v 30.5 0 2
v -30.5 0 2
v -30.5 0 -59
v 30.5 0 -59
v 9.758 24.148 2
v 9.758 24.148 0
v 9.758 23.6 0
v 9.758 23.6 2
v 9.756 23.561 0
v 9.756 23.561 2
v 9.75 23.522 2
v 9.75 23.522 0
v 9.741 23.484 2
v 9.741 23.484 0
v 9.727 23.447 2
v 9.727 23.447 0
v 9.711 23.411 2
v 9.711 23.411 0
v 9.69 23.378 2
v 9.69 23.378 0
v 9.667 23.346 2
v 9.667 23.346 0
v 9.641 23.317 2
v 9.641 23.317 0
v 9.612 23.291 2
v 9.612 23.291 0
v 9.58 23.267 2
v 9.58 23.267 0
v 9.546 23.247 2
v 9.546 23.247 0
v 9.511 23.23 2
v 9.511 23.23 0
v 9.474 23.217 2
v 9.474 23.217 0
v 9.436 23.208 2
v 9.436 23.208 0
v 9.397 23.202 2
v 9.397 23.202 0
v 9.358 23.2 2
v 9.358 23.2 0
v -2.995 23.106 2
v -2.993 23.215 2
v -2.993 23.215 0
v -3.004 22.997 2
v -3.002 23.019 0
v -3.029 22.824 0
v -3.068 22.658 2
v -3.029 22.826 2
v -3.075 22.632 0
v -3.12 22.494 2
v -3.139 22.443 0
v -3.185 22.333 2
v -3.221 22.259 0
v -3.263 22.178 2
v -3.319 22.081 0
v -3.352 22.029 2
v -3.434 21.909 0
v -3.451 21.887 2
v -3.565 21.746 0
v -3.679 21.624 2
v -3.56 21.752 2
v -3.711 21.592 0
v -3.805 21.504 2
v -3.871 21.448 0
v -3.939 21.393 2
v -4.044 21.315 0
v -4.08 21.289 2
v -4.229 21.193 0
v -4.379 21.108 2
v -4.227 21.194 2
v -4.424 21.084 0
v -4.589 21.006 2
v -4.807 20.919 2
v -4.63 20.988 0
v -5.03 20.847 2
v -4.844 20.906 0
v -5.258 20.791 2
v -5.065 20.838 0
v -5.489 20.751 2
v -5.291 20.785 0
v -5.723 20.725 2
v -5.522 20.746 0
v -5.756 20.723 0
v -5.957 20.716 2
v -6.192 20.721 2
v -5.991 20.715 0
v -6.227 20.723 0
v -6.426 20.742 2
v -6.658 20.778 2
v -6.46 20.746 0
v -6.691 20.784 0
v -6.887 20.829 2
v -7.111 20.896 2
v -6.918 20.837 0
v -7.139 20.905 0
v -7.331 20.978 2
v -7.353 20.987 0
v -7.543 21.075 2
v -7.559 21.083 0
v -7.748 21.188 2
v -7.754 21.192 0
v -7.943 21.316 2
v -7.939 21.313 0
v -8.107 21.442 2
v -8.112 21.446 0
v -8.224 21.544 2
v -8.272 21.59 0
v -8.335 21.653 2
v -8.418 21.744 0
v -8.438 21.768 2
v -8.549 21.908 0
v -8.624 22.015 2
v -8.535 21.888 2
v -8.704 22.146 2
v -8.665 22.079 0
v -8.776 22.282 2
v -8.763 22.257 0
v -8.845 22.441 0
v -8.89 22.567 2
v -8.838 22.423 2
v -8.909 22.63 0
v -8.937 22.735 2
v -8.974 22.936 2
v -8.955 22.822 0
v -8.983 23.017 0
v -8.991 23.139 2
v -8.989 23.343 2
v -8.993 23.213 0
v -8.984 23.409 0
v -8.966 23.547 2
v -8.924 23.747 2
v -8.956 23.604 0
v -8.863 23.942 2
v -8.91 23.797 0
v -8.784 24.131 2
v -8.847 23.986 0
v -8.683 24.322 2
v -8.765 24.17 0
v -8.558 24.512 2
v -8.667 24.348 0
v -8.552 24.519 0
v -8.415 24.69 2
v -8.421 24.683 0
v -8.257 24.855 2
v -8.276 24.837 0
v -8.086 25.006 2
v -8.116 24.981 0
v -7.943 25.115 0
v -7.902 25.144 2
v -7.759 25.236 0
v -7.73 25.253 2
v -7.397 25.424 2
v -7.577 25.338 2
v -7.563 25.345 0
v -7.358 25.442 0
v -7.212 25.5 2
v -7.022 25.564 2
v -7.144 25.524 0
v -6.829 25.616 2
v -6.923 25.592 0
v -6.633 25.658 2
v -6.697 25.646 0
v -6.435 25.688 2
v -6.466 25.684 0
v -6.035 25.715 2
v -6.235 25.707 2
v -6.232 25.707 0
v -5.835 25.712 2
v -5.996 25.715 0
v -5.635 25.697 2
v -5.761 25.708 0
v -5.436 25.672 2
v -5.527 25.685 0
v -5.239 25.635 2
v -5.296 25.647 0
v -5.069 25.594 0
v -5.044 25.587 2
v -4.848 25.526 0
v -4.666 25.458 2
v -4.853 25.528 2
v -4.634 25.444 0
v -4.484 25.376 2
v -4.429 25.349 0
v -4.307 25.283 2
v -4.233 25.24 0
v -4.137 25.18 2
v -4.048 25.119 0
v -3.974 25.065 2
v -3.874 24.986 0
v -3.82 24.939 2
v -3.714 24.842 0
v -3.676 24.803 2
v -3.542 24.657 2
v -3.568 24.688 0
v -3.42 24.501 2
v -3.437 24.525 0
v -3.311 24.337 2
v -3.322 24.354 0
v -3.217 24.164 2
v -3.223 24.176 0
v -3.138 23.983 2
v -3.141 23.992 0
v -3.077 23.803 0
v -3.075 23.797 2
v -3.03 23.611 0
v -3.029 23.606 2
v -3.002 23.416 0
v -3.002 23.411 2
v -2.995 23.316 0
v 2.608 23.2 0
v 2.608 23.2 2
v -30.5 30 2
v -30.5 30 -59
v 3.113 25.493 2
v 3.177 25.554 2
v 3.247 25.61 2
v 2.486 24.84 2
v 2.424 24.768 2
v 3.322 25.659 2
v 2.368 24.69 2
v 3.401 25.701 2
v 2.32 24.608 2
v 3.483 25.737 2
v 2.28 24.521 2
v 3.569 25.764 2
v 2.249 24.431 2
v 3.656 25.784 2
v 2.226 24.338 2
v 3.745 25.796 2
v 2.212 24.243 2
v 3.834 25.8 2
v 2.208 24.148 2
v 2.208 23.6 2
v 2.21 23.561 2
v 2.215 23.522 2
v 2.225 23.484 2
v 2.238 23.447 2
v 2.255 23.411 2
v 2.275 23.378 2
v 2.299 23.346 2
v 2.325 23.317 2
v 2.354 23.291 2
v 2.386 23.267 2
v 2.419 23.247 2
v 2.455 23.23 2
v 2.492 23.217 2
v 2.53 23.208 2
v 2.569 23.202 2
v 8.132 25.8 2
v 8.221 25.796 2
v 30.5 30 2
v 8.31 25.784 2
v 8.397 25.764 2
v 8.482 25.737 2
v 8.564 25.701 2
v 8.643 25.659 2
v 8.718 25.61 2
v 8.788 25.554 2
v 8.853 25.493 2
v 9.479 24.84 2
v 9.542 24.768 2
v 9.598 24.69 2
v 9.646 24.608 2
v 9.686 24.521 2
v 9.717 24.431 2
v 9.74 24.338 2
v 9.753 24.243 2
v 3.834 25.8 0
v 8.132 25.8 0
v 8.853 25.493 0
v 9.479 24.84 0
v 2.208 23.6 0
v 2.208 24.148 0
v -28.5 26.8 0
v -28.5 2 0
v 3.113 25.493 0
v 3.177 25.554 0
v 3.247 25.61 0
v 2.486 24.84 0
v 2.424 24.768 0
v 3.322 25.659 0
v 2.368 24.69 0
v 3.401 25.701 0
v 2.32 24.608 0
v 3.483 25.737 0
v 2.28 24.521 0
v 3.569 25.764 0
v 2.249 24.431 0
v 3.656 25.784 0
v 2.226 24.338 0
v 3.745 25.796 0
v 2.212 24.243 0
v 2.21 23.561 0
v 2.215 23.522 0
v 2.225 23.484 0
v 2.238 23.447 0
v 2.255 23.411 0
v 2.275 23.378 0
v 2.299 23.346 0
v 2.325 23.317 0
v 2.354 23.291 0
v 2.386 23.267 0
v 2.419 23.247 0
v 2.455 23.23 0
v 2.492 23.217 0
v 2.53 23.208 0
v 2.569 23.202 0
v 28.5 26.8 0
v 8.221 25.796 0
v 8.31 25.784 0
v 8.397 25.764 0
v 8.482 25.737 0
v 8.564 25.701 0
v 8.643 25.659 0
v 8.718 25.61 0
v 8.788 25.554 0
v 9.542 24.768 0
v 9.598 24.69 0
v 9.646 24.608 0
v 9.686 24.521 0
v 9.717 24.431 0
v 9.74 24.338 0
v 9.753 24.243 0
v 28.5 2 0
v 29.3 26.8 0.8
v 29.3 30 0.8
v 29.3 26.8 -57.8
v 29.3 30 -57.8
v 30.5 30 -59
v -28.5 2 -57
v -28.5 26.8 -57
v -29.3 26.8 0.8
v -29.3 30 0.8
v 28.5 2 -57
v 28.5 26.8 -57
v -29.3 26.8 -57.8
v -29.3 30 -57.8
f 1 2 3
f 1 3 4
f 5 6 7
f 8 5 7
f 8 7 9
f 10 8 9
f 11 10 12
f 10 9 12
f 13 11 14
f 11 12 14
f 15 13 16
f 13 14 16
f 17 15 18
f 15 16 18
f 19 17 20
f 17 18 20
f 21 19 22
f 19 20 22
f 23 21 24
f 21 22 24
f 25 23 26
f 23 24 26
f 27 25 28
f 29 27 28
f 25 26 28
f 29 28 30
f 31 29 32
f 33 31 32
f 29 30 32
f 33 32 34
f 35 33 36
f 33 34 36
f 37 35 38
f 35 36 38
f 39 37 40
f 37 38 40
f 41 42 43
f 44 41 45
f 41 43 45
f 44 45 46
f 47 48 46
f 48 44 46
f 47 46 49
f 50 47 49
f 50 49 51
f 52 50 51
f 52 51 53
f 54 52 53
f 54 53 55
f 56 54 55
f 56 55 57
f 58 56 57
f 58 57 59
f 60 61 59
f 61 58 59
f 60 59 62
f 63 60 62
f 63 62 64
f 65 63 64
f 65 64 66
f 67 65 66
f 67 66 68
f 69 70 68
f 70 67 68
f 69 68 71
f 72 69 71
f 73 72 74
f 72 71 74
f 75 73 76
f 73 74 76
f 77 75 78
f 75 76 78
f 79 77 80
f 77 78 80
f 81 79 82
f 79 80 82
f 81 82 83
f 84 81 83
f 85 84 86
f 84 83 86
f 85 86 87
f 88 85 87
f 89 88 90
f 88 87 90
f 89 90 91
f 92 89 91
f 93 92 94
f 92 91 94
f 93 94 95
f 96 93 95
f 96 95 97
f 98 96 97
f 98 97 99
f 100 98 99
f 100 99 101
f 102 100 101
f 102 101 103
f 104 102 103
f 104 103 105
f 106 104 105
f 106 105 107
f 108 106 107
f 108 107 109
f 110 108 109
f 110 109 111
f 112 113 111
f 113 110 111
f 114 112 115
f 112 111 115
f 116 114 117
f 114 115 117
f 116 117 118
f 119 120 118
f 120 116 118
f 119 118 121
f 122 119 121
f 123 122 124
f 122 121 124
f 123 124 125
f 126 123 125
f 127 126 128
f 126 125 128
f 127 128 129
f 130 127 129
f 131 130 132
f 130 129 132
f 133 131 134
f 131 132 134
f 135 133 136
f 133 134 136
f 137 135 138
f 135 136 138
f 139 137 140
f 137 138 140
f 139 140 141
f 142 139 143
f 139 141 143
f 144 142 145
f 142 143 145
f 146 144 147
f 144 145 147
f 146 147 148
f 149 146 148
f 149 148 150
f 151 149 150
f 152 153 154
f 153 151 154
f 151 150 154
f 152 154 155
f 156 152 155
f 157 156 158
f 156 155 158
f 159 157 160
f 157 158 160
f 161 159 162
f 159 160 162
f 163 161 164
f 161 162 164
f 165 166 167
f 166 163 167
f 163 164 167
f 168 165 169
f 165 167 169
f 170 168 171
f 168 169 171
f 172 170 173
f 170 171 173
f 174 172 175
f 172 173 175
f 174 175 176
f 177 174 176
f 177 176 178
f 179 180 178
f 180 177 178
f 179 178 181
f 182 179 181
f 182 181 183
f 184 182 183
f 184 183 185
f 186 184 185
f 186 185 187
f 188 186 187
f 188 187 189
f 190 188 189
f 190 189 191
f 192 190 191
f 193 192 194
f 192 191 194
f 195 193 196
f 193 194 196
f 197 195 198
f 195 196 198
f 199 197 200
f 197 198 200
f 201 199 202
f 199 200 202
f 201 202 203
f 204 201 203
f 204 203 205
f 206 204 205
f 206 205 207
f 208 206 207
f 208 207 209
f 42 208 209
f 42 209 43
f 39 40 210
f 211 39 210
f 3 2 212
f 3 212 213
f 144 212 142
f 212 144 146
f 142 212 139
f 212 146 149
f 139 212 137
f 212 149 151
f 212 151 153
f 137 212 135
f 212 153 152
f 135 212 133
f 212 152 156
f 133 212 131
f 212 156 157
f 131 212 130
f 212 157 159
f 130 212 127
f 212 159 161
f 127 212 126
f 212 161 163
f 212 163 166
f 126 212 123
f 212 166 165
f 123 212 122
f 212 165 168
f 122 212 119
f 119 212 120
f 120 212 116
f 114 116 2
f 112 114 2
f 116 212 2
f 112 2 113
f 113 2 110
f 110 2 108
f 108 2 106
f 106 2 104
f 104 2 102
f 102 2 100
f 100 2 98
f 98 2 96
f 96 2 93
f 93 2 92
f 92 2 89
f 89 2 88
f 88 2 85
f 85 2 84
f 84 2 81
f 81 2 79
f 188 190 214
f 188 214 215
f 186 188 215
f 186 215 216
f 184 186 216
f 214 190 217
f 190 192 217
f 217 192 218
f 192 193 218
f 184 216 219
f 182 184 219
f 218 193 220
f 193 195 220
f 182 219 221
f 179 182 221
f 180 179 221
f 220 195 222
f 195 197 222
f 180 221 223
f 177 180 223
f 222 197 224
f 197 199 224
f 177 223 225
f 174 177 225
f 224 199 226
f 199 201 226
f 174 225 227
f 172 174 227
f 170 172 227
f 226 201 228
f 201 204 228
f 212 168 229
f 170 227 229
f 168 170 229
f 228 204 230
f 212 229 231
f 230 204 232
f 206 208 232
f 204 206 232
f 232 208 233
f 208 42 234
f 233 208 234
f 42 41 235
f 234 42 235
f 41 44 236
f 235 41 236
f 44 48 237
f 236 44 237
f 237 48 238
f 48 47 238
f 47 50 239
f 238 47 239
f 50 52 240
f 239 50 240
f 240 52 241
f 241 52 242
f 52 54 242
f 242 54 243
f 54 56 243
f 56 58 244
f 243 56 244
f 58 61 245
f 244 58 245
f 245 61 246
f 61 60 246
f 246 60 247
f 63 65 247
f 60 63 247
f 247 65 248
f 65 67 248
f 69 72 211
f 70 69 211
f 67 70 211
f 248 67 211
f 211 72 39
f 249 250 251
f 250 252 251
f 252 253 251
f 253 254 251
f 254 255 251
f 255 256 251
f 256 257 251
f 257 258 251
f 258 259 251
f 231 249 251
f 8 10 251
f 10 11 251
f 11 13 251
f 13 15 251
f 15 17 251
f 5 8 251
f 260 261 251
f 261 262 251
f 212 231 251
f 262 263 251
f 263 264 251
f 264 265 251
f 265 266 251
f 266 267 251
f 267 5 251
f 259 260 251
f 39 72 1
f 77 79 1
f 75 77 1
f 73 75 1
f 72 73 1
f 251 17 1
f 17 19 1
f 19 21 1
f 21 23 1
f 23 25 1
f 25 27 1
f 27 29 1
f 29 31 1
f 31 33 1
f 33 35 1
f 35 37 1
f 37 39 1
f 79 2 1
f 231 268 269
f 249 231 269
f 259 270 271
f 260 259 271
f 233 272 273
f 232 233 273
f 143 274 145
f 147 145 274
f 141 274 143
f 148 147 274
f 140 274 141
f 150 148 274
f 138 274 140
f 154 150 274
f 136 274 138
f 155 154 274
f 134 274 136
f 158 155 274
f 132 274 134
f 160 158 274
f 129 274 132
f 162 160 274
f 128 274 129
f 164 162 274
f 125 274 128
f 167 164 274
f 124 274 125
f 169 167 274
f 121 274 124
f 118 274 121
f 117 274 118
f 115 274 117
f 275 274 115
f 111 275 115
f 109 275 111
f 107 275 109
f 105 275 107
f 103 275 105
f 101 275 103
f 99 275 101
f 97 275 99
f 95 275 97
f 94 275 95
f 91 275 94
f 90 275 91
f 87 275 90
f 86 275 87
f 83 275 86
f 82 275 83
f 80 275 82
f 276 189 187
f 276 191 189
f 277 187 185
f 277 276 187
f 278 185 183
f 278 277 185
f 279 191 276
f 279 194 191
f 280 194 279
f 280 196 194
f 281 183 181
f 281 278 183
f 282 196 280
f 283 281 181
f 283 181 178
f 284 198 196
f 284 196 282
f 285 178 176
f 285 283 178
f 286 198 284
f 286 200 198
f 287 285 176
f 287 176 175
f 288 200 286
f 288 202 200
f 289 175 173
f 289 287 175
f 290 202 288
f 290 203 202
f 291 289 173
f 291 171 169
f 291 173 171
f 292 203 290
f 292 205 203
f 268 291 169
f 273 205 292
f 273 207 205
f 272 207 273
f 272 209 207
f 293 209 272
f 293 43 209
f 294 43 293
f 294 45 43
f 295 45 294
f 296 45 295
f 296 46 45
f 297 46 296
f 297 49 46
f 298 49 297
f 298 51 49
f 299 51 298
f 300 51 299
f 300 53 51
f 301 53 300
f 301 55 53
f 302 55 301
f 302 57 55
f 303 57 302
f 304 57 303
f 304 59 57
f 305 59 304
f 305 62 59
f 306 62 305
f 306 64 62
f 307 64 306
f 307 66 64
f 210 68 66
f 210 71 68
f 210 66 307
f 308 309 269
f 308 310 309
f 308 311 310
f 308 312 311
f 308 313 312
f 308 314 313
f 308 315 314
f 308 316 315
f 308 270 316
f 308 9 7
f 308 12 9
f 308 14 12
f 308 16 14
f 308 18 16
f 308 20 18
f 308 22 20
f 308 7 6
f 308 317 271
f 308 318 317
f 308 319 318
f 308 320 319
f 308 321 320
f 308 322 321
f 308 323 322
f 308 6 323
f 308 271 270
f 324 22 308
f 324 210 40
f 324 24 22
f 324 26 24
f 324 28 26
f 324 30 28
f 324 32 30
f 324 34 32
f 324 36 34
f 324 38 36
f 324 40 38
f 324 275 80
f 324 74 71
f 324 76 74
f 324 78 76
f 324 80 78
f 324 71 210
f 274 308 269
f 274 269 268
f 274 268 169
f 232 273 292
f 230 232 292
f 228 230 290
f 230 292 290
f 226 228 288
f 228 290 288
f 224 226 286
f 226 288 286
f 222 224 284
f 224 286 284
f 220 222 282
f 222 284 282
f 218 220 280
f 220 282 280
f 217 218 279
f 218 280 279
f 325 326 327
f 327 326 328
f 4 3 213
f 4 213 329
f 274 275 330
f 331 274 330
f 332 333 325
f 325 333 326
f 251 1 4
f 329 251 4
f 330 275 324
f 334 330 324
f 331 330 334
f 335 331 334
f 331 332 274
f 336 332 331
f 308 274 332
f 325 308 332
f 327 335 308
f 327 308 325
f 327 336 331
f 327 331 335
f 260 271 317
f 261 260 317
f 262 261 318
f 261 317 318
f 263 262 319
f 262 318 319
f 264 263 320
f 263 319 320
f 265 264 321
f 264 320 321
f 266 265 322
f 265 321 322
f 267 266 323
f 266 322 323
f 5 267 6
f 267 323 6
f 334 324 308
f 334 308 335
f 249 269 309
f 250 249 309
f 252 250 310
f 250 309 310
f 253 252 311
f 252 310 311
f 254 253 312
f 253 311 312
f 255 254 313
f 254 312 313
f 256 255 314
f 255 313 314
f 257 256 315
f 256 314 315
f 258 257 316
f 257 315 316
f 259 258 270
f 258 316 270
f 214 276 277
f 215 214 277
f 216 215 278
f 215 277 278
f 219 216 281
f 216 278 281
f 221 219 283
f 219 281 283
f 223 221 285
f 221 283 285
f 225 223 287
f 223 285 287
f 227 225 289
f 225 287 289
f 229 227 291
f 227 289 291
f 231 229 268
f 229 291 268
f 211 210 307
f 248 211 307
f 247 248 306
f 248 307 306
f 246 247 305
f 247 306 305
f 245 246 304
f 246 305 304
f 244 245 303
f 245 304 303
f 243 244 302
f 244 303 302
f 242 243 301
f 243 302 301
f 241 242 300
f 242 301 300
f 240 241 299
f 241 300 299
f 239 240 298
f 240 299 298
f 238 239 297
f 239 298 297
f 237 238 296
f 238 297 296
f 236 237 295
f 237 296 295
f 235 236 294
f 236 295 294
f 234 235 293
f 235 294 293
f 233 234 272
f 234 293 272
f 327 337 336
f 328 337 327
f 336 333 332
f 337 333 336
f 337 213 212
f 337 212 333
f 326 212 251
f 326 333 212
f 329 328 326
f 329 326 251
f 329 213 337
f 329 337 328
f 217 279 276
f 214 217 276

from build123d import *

# Parameters (mm, degrees)
SKETCH1_W           = 61
SKETCH1_H           = 61
SKETCH1_W_2         = 57
SKETCH1_H_2         = 57
BOSS_EXTRUDE2_DEPTH = 30
SKETCH2_W           = 58.6
SKETCH2_H           = 58.6
CUT_EXTRUDE1_DEPTH  = 3.2
SKETCH4_RX          = 3
SKETCH4_RY          = 2.5
CUT_EXTRUDE2_DEPTH  = 73.878323252
SKETCH5_W           = 57
SKETCH5_H           = 57
BOSS_EXTRUDE3_DEPTH = 2


with BuildPart() as part:
    # Sketch1 → Boss-Extrude2 (new body)
    with BuildSketch(Plane(origin=(0, 0, 0), x_dir=(1, 0, 0), z_dir=(0, 1, 0))):
        with Locations((0, 28.5)):
            Rectangle(SKETCH1_W, SKETCH1_H)
        with Locations((0, 28.5)):
            Rectangle(SKETCH1_W_2, SKETCH1_H_2, mode=Mode.SUBTRACT)
    extrude(amount=BOSS_EXTRUDE2_DEPTH)

    # Sketch2 → Cut-Extrude1 (cut)
    with BuildSketch(Plane(origin=(0, 30, 0), x_dir=(1, 0, 0), z_dir=(0, 1, 0))):
        with Locations((0, 28.5)):
            Rectangle(SKETCH2_W, SKETCH2_H)
    extrude(amount=-CUT_EXTRUDE1_DEPTH, mode=Mode.SUBTRACT)

    # Sketch4 → Cut-Extrude2 (cut, through all)
    with BuildSketch(Plane(origin=(0, 0, 0), x_dir=(-1, 0, 0), z_dir=(0, 0, -1))):
        with BuildLine():
            Line((-5.98277454, 23.2), (-5.98277454, 25.8))
            Line((-5.98277454, 25.8), (-8.131556664, 25.8))
            ThreePointArc((-8.131556664, 25.8), (-8.523646049, 25.719927124), (-8.852943985, 25.492531828))
            Line((-8.852943985, 25.492531828), (-9.479161861, 24.840221541))
            ThreePointArc((-9.479161861, 24.840221541), (-9.685510311, 24.520927357), (-9.75777454, 24.147689712))
            Line((-9.75777454, 24.147689712), (-9.75777454, 23.6))
            ThreePointArc((-9.75777454, 23.6), (-9.640617252, 23.317157288), (-9.35777454, 23.2))
            Line((-9.35777454, 23.2), (-5.98277454, 23.2))
        make_face()
        with BuildLine():
            Line((-3.833992416, 25.8), (-5.98277454, 25.8))
            Line((-5.98277454, 25.8), (-5.98277454, 23.2))
            Line((-5.98277454, 23.2), (-2.60777454, 23.2))
            ThreePointArc((-2.60777454, 23.2), (-2.324931828, 23.317157288), (-2.20777454, 23.6))
            Line((-2.20777454, 23.6), (-2.20777454, 24.147689712))
            ThreePointArc((-2.20777454, 24.147689712), (-2.280038769, 24.520927357), (-2.486387219, 24.840221541))
            Line((-2.486387219, 24.840221541), (-3.112605095, 25.492531828))
            ThreePointArc((-3.112605095, 25.492531828), (-3.441903031, 25.719927124), (-3.833992416, 25.8))
        make_face()
        with Locations(Location((5.992555786, 23.215339324), (0, 0, 180))):
            Ellipse(SKETCH4_RX, SKETCH4_RY)
    extrude(amount=-CUT_EXTRUDE2_DEPTH, mode=Mode.SUBTRACT)

    # Sketch5 → Boss-Extrude3 (add)
    with BuildSketch(Plane.XZ):
        with Locations((0, -28.5)):
            Rectangle(SKETCH5_W, SKETCH5_H)
    extrude(amount=-BOSS_EXTRUDE3_DEPTH)


solid = part.part
